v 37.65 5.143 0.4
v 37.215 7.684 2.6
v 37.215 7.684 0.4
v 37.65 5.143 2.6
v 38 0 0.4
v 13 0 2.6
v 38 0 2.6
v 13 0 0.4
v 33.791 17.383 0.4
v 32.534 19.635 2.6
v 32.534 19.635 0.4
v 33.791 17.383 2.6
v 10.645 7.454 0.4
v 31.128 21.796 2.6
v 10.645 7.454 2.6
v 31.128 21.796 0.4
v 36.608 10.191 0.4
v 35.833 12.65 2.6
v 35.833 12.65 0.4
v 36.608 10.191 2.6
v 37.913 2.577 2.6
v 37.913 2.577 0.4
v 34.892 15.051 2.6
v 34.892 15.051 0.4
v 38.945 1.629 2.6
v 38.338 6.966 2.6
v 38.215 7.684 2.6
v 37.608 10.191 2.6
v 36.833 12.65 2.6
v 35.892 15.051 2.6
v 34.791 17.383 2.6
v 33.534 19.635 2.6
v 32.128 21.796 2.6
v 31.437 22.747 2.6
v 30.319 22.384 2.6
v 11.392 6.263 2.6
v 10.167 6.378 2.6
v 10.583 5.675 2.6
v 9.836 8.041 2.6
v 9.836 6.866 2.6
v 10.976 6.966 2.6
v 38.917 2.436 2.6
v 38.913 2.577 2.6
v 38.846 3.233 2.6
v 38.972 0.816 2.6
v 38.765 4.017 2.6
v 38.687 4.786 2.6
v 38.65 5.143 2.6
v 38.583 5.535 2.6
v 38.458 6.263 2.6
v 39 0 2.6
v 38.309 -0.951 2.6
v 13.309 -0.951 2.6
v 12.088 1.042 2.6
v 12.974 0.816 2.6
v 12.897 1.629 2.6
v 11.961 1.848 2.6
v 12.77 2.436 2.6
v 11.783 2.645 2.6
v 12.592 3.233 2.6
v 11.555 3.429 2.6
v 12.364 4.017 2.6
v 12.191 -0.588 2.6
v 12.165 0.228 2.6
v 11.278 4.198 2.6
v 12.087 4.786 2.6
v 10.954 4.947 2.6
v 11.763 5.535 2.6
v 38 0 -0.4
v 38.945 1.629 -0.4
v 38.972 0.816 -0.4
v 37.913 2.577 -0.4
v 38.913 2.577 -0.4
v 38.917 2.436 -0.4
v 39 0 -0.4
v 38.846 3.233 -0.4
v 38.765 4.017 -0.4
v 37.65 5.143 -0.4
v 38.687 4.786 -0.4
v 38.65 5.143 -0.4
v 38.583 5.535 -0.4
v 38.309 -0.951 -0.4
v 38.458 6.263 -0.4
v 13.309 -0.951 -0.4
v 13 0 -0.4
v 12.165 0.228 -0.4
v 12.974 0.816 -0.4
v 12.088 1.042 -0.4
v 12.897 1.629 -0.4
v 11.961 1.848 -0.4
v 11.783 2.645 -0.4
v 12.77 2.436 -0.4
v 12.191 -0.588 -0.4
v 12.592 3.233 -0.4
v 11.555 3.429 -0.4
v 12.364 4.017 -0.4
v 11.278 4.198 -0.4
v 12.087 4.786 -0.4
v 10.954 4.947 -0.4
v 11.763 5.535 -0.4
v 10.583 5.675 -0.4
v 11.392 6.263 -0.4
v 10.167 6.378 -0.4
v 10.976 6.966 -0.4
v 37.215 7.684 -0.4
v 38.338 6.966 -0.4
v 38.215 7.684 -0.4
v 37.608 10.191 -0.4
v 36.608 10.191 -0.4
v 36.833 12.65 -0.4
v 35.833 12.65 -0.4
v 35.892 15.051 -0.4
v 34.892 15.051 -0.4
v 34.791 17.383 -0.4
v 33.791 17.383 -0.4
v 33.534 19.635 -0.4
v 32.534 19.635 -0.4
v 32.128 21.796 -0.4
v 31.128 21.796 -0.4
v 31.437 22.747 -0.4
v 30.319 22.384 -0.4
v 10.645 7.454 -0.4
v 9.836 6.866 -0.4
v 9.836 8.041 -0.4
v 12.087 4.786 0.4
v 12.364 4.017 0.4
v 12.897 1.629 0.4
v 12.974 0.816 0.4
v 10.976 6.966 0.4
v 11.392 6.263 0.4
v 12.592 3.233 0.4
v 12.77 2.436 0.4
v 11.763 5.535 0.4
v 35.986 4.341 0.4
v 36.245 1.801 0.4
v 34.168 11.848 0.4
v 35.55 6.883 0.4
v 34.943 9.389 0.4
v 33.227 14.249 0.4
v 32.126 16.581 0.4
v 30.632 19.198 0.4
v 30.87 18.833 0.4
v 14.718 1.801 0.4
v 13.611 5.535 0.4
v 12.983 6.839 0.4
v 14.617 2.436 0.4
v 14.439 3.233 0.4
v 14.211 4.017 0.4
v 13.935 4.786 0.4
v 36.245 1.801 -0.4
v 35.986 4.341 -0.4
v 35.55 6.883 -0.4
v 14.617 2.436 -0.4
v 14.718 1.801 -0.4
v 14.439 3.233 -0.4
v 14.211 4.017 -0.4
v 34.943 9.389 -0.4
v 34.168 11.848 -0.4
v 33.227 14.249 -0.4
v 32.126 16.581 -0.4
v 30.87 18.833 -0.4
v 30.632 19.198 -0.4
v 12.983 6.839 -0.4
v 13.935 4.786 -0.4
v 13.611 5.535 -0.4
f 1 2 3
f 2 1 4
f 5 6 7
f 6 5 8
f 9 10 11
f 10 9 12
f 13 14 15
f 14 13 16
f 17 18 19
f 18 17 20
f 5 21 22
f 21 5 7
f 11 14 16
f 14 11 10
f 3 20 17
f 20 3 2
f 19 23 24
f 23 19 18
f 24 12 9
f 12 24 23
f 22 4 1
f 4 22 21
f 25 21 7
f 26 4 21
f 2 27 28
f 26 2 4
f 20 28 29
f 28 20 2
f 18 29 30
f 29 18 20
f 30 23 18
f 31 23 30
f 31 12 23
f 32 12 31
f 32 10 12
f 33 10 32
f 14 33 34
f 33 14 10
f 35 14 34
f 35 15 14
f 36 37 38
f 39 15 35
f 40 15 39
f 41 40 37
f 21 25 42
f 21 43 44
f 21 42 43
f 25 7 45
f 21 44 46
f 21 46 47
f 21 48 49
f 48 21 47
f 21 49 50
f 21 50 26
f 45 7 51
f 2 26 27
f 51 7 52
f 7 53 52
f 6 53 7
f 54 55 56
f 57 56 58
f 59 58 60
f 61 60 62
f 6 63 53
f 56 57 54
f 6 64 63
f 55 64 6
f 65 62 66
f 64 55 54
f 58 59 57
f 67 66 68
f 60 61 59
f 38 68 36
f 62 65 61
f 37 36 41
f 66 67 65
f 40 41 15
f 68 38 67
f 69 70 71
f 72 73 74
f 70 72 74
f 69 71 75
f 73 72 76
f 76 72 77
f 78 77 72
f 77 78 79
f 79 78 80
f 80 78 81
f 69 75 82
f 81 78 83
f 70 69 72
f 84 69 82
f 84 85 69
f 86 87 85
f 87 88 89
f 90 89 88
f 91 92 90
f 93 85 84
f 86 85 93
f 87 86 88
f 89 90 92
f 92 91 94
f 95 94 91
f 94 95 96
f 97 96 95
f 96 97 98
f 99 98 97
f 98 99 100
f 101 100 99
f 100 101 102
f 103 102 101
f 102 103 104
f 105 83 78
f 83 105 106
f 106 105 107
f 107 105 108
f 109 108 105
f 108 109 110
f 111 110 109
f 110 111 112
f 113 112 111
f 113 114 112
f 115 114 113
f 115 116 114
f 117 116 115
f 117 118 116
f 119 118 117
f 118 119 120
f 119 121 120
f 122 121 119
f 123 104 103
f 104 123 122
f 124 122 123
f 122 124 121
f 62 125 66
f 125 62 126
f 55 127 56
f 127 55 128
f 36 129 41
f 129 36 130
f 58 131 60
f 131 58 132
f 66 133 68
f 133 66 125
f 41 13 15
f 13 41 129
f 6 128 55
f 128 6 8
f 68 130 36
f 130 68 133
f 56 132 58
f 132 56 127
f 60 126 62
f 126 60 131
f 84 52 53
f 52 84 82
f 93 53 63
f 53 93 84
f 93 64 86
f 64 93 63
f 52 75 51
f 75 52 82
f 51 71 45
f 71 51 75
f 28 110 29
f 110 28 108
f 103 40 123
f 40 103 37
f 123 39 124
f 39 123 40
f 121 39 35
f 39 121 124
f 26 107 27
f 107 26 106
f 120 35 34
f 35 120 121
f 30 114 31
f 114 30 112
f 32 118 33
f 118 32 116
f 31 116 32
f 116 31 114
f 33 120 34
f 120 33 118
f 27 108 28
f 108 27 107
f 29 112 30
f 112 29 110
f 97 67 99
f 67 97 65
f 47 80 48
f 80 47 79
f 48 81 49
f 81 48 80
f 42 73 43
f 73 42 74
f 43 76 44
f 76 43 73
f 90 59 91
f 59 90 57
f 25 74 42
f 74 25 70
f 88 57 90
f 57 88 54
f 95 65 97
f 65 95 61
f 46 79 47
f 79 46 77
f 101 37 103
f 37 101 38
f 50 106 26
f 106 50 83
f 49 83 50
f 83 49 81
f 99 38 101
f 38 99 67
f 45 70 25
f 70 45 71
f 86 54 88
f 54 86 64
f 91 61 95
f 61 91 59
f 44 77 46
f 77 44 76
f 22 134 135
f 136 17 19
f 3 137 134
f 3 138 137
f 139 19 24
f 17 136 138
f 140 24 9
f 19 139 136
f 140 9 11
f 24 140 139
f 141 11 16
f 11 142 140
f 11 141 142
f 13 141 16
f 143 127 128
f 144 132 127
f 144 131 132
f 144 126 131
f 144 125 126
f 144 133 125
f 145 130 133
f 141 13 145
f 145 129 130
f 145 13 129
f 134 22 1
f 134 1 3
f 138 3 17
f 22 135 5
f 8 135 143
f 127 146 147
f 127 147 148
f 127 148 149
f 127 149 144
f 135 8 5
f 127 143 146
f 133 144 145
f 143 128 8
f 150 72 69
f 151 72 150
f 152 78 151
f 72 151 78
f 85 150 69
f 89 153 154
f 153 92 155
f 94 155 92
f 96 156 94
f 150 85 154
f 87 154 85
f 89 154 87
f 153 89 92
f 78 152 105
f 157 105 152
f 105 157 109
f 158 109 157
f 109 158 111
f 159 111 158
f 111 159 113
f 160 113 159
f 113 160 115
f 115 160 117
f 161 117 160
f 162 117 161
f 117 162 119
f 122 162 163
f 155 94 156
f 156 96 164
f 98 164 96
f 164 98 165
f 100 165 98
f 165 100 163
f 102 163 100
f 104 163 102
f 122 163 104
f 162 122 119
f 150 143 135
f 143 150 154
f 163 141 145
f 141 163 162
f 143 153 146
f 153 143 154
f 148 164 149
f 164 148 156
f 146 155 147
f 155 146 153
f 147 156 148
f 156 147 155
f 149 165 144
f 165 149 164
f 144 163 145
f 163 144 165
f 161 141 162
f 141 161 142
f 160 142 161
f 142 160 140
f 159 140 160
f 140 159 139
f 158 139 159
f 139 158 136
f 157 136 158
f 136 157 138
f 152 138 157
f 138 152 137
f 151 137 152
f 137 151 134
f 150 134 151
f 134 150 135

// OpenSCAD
module storm() 
{ 
 rotate([0,180,0])
    scale([0.127,0.127,1])
        linear_extrude(height = 1,  scale=1, center = true)
            import(file = "Storm.svg", center = true,dpi = 96);
}


module techToken() 
{ 
 rotate([0,180,0])
    scale([0.128,0.128,1])
        linear_extrude(height = 1,  scale=1, center = true)
            import(file = "TechToken.svg", center = true, dpi = 96);
}

module shell(thickness,height) {
    intersection() {
        //translate([0,0,-2])
        scale([1,1,height])
            children(0);   
        minkowski() {
            difference () {
                // Universe cube
                translate([-150/2, -150/2, -height/2 ]) 
                    cube([150, 150, height]);
                // Original part
                scale([1,1,height])
                    children(0); 
            }
            // Tool for the minkowski shell
            sphere(r=thickness);
        }
    } 
}


module raindrop2D(thick, radius, length, center = true){
    l = length - radius;
    x = (radius * radius)/l;
    y = (radius/l) * sqrt((l * l) -(radius * radius));
    echo(x);
    echo(y);
	if(!center){
		translate([radius, radius, 0]){
			cylinder(h = thick, r = radius,$fn=100);
			linear_extrude(height = thick)
			polygon(points=[[x, y],
                            [x, -y],
                            [l, 0]], paths=[[0,1,2]]);
		}
	}else if(center){
        translate([0, 0, 0-thick/2]){
            cylinder(h = thick, r = radius,$fn=100);
                linear_extrude(height = thick)
                polygon(points=[[x, y],
                                [x, -y],
                                [l, 0]], paths=[[0,1,2]]);
        }
	}	
}

module shell2(thickness,height) {
    difference() {
        minkowski() {
            scale([1,1,height])
                children(0);
            sphere(r = thickness);
        }

        //translate([0,0,2])
            scale([1,1,height])
                children(0);
        translate([-250,-250,height/2])
            cube([500,500,thickness]);
        translate([-250,-250,-thickness-height/2])
            cube([500,500,thickness]);
    }
}

module stormHolder()
{
    tokenHolder(3,2.2,1,2)
        storm();
}

module techTokenHolder()
{
    tokenHolder(3,2.2,1,2)
        techToken();
}

module hmsHolder()
{
    tokenHolder(3,2.2,1,2)
        raindrop2D(1, 15, 45, center = true);
}

module tokenHolder(holder_height,token_height,wall_width,base_width)
{
     translate([0,0,token_height/2])
        shell2(wall_width,holder_height)
            children(0);
            
    shell(base_width,holder_height-token_height)
        children(0);
}
 
//techTokenHolder();
tokenHolder(3,2.2,1,2)
translate([0,0,-0.5])
difference() {
rotate_extrude(angle = 35,$fn=100)
    square([38,1,]);
rotate_extrude(angle =360, $fn =100)
    square([13,1]);
}
